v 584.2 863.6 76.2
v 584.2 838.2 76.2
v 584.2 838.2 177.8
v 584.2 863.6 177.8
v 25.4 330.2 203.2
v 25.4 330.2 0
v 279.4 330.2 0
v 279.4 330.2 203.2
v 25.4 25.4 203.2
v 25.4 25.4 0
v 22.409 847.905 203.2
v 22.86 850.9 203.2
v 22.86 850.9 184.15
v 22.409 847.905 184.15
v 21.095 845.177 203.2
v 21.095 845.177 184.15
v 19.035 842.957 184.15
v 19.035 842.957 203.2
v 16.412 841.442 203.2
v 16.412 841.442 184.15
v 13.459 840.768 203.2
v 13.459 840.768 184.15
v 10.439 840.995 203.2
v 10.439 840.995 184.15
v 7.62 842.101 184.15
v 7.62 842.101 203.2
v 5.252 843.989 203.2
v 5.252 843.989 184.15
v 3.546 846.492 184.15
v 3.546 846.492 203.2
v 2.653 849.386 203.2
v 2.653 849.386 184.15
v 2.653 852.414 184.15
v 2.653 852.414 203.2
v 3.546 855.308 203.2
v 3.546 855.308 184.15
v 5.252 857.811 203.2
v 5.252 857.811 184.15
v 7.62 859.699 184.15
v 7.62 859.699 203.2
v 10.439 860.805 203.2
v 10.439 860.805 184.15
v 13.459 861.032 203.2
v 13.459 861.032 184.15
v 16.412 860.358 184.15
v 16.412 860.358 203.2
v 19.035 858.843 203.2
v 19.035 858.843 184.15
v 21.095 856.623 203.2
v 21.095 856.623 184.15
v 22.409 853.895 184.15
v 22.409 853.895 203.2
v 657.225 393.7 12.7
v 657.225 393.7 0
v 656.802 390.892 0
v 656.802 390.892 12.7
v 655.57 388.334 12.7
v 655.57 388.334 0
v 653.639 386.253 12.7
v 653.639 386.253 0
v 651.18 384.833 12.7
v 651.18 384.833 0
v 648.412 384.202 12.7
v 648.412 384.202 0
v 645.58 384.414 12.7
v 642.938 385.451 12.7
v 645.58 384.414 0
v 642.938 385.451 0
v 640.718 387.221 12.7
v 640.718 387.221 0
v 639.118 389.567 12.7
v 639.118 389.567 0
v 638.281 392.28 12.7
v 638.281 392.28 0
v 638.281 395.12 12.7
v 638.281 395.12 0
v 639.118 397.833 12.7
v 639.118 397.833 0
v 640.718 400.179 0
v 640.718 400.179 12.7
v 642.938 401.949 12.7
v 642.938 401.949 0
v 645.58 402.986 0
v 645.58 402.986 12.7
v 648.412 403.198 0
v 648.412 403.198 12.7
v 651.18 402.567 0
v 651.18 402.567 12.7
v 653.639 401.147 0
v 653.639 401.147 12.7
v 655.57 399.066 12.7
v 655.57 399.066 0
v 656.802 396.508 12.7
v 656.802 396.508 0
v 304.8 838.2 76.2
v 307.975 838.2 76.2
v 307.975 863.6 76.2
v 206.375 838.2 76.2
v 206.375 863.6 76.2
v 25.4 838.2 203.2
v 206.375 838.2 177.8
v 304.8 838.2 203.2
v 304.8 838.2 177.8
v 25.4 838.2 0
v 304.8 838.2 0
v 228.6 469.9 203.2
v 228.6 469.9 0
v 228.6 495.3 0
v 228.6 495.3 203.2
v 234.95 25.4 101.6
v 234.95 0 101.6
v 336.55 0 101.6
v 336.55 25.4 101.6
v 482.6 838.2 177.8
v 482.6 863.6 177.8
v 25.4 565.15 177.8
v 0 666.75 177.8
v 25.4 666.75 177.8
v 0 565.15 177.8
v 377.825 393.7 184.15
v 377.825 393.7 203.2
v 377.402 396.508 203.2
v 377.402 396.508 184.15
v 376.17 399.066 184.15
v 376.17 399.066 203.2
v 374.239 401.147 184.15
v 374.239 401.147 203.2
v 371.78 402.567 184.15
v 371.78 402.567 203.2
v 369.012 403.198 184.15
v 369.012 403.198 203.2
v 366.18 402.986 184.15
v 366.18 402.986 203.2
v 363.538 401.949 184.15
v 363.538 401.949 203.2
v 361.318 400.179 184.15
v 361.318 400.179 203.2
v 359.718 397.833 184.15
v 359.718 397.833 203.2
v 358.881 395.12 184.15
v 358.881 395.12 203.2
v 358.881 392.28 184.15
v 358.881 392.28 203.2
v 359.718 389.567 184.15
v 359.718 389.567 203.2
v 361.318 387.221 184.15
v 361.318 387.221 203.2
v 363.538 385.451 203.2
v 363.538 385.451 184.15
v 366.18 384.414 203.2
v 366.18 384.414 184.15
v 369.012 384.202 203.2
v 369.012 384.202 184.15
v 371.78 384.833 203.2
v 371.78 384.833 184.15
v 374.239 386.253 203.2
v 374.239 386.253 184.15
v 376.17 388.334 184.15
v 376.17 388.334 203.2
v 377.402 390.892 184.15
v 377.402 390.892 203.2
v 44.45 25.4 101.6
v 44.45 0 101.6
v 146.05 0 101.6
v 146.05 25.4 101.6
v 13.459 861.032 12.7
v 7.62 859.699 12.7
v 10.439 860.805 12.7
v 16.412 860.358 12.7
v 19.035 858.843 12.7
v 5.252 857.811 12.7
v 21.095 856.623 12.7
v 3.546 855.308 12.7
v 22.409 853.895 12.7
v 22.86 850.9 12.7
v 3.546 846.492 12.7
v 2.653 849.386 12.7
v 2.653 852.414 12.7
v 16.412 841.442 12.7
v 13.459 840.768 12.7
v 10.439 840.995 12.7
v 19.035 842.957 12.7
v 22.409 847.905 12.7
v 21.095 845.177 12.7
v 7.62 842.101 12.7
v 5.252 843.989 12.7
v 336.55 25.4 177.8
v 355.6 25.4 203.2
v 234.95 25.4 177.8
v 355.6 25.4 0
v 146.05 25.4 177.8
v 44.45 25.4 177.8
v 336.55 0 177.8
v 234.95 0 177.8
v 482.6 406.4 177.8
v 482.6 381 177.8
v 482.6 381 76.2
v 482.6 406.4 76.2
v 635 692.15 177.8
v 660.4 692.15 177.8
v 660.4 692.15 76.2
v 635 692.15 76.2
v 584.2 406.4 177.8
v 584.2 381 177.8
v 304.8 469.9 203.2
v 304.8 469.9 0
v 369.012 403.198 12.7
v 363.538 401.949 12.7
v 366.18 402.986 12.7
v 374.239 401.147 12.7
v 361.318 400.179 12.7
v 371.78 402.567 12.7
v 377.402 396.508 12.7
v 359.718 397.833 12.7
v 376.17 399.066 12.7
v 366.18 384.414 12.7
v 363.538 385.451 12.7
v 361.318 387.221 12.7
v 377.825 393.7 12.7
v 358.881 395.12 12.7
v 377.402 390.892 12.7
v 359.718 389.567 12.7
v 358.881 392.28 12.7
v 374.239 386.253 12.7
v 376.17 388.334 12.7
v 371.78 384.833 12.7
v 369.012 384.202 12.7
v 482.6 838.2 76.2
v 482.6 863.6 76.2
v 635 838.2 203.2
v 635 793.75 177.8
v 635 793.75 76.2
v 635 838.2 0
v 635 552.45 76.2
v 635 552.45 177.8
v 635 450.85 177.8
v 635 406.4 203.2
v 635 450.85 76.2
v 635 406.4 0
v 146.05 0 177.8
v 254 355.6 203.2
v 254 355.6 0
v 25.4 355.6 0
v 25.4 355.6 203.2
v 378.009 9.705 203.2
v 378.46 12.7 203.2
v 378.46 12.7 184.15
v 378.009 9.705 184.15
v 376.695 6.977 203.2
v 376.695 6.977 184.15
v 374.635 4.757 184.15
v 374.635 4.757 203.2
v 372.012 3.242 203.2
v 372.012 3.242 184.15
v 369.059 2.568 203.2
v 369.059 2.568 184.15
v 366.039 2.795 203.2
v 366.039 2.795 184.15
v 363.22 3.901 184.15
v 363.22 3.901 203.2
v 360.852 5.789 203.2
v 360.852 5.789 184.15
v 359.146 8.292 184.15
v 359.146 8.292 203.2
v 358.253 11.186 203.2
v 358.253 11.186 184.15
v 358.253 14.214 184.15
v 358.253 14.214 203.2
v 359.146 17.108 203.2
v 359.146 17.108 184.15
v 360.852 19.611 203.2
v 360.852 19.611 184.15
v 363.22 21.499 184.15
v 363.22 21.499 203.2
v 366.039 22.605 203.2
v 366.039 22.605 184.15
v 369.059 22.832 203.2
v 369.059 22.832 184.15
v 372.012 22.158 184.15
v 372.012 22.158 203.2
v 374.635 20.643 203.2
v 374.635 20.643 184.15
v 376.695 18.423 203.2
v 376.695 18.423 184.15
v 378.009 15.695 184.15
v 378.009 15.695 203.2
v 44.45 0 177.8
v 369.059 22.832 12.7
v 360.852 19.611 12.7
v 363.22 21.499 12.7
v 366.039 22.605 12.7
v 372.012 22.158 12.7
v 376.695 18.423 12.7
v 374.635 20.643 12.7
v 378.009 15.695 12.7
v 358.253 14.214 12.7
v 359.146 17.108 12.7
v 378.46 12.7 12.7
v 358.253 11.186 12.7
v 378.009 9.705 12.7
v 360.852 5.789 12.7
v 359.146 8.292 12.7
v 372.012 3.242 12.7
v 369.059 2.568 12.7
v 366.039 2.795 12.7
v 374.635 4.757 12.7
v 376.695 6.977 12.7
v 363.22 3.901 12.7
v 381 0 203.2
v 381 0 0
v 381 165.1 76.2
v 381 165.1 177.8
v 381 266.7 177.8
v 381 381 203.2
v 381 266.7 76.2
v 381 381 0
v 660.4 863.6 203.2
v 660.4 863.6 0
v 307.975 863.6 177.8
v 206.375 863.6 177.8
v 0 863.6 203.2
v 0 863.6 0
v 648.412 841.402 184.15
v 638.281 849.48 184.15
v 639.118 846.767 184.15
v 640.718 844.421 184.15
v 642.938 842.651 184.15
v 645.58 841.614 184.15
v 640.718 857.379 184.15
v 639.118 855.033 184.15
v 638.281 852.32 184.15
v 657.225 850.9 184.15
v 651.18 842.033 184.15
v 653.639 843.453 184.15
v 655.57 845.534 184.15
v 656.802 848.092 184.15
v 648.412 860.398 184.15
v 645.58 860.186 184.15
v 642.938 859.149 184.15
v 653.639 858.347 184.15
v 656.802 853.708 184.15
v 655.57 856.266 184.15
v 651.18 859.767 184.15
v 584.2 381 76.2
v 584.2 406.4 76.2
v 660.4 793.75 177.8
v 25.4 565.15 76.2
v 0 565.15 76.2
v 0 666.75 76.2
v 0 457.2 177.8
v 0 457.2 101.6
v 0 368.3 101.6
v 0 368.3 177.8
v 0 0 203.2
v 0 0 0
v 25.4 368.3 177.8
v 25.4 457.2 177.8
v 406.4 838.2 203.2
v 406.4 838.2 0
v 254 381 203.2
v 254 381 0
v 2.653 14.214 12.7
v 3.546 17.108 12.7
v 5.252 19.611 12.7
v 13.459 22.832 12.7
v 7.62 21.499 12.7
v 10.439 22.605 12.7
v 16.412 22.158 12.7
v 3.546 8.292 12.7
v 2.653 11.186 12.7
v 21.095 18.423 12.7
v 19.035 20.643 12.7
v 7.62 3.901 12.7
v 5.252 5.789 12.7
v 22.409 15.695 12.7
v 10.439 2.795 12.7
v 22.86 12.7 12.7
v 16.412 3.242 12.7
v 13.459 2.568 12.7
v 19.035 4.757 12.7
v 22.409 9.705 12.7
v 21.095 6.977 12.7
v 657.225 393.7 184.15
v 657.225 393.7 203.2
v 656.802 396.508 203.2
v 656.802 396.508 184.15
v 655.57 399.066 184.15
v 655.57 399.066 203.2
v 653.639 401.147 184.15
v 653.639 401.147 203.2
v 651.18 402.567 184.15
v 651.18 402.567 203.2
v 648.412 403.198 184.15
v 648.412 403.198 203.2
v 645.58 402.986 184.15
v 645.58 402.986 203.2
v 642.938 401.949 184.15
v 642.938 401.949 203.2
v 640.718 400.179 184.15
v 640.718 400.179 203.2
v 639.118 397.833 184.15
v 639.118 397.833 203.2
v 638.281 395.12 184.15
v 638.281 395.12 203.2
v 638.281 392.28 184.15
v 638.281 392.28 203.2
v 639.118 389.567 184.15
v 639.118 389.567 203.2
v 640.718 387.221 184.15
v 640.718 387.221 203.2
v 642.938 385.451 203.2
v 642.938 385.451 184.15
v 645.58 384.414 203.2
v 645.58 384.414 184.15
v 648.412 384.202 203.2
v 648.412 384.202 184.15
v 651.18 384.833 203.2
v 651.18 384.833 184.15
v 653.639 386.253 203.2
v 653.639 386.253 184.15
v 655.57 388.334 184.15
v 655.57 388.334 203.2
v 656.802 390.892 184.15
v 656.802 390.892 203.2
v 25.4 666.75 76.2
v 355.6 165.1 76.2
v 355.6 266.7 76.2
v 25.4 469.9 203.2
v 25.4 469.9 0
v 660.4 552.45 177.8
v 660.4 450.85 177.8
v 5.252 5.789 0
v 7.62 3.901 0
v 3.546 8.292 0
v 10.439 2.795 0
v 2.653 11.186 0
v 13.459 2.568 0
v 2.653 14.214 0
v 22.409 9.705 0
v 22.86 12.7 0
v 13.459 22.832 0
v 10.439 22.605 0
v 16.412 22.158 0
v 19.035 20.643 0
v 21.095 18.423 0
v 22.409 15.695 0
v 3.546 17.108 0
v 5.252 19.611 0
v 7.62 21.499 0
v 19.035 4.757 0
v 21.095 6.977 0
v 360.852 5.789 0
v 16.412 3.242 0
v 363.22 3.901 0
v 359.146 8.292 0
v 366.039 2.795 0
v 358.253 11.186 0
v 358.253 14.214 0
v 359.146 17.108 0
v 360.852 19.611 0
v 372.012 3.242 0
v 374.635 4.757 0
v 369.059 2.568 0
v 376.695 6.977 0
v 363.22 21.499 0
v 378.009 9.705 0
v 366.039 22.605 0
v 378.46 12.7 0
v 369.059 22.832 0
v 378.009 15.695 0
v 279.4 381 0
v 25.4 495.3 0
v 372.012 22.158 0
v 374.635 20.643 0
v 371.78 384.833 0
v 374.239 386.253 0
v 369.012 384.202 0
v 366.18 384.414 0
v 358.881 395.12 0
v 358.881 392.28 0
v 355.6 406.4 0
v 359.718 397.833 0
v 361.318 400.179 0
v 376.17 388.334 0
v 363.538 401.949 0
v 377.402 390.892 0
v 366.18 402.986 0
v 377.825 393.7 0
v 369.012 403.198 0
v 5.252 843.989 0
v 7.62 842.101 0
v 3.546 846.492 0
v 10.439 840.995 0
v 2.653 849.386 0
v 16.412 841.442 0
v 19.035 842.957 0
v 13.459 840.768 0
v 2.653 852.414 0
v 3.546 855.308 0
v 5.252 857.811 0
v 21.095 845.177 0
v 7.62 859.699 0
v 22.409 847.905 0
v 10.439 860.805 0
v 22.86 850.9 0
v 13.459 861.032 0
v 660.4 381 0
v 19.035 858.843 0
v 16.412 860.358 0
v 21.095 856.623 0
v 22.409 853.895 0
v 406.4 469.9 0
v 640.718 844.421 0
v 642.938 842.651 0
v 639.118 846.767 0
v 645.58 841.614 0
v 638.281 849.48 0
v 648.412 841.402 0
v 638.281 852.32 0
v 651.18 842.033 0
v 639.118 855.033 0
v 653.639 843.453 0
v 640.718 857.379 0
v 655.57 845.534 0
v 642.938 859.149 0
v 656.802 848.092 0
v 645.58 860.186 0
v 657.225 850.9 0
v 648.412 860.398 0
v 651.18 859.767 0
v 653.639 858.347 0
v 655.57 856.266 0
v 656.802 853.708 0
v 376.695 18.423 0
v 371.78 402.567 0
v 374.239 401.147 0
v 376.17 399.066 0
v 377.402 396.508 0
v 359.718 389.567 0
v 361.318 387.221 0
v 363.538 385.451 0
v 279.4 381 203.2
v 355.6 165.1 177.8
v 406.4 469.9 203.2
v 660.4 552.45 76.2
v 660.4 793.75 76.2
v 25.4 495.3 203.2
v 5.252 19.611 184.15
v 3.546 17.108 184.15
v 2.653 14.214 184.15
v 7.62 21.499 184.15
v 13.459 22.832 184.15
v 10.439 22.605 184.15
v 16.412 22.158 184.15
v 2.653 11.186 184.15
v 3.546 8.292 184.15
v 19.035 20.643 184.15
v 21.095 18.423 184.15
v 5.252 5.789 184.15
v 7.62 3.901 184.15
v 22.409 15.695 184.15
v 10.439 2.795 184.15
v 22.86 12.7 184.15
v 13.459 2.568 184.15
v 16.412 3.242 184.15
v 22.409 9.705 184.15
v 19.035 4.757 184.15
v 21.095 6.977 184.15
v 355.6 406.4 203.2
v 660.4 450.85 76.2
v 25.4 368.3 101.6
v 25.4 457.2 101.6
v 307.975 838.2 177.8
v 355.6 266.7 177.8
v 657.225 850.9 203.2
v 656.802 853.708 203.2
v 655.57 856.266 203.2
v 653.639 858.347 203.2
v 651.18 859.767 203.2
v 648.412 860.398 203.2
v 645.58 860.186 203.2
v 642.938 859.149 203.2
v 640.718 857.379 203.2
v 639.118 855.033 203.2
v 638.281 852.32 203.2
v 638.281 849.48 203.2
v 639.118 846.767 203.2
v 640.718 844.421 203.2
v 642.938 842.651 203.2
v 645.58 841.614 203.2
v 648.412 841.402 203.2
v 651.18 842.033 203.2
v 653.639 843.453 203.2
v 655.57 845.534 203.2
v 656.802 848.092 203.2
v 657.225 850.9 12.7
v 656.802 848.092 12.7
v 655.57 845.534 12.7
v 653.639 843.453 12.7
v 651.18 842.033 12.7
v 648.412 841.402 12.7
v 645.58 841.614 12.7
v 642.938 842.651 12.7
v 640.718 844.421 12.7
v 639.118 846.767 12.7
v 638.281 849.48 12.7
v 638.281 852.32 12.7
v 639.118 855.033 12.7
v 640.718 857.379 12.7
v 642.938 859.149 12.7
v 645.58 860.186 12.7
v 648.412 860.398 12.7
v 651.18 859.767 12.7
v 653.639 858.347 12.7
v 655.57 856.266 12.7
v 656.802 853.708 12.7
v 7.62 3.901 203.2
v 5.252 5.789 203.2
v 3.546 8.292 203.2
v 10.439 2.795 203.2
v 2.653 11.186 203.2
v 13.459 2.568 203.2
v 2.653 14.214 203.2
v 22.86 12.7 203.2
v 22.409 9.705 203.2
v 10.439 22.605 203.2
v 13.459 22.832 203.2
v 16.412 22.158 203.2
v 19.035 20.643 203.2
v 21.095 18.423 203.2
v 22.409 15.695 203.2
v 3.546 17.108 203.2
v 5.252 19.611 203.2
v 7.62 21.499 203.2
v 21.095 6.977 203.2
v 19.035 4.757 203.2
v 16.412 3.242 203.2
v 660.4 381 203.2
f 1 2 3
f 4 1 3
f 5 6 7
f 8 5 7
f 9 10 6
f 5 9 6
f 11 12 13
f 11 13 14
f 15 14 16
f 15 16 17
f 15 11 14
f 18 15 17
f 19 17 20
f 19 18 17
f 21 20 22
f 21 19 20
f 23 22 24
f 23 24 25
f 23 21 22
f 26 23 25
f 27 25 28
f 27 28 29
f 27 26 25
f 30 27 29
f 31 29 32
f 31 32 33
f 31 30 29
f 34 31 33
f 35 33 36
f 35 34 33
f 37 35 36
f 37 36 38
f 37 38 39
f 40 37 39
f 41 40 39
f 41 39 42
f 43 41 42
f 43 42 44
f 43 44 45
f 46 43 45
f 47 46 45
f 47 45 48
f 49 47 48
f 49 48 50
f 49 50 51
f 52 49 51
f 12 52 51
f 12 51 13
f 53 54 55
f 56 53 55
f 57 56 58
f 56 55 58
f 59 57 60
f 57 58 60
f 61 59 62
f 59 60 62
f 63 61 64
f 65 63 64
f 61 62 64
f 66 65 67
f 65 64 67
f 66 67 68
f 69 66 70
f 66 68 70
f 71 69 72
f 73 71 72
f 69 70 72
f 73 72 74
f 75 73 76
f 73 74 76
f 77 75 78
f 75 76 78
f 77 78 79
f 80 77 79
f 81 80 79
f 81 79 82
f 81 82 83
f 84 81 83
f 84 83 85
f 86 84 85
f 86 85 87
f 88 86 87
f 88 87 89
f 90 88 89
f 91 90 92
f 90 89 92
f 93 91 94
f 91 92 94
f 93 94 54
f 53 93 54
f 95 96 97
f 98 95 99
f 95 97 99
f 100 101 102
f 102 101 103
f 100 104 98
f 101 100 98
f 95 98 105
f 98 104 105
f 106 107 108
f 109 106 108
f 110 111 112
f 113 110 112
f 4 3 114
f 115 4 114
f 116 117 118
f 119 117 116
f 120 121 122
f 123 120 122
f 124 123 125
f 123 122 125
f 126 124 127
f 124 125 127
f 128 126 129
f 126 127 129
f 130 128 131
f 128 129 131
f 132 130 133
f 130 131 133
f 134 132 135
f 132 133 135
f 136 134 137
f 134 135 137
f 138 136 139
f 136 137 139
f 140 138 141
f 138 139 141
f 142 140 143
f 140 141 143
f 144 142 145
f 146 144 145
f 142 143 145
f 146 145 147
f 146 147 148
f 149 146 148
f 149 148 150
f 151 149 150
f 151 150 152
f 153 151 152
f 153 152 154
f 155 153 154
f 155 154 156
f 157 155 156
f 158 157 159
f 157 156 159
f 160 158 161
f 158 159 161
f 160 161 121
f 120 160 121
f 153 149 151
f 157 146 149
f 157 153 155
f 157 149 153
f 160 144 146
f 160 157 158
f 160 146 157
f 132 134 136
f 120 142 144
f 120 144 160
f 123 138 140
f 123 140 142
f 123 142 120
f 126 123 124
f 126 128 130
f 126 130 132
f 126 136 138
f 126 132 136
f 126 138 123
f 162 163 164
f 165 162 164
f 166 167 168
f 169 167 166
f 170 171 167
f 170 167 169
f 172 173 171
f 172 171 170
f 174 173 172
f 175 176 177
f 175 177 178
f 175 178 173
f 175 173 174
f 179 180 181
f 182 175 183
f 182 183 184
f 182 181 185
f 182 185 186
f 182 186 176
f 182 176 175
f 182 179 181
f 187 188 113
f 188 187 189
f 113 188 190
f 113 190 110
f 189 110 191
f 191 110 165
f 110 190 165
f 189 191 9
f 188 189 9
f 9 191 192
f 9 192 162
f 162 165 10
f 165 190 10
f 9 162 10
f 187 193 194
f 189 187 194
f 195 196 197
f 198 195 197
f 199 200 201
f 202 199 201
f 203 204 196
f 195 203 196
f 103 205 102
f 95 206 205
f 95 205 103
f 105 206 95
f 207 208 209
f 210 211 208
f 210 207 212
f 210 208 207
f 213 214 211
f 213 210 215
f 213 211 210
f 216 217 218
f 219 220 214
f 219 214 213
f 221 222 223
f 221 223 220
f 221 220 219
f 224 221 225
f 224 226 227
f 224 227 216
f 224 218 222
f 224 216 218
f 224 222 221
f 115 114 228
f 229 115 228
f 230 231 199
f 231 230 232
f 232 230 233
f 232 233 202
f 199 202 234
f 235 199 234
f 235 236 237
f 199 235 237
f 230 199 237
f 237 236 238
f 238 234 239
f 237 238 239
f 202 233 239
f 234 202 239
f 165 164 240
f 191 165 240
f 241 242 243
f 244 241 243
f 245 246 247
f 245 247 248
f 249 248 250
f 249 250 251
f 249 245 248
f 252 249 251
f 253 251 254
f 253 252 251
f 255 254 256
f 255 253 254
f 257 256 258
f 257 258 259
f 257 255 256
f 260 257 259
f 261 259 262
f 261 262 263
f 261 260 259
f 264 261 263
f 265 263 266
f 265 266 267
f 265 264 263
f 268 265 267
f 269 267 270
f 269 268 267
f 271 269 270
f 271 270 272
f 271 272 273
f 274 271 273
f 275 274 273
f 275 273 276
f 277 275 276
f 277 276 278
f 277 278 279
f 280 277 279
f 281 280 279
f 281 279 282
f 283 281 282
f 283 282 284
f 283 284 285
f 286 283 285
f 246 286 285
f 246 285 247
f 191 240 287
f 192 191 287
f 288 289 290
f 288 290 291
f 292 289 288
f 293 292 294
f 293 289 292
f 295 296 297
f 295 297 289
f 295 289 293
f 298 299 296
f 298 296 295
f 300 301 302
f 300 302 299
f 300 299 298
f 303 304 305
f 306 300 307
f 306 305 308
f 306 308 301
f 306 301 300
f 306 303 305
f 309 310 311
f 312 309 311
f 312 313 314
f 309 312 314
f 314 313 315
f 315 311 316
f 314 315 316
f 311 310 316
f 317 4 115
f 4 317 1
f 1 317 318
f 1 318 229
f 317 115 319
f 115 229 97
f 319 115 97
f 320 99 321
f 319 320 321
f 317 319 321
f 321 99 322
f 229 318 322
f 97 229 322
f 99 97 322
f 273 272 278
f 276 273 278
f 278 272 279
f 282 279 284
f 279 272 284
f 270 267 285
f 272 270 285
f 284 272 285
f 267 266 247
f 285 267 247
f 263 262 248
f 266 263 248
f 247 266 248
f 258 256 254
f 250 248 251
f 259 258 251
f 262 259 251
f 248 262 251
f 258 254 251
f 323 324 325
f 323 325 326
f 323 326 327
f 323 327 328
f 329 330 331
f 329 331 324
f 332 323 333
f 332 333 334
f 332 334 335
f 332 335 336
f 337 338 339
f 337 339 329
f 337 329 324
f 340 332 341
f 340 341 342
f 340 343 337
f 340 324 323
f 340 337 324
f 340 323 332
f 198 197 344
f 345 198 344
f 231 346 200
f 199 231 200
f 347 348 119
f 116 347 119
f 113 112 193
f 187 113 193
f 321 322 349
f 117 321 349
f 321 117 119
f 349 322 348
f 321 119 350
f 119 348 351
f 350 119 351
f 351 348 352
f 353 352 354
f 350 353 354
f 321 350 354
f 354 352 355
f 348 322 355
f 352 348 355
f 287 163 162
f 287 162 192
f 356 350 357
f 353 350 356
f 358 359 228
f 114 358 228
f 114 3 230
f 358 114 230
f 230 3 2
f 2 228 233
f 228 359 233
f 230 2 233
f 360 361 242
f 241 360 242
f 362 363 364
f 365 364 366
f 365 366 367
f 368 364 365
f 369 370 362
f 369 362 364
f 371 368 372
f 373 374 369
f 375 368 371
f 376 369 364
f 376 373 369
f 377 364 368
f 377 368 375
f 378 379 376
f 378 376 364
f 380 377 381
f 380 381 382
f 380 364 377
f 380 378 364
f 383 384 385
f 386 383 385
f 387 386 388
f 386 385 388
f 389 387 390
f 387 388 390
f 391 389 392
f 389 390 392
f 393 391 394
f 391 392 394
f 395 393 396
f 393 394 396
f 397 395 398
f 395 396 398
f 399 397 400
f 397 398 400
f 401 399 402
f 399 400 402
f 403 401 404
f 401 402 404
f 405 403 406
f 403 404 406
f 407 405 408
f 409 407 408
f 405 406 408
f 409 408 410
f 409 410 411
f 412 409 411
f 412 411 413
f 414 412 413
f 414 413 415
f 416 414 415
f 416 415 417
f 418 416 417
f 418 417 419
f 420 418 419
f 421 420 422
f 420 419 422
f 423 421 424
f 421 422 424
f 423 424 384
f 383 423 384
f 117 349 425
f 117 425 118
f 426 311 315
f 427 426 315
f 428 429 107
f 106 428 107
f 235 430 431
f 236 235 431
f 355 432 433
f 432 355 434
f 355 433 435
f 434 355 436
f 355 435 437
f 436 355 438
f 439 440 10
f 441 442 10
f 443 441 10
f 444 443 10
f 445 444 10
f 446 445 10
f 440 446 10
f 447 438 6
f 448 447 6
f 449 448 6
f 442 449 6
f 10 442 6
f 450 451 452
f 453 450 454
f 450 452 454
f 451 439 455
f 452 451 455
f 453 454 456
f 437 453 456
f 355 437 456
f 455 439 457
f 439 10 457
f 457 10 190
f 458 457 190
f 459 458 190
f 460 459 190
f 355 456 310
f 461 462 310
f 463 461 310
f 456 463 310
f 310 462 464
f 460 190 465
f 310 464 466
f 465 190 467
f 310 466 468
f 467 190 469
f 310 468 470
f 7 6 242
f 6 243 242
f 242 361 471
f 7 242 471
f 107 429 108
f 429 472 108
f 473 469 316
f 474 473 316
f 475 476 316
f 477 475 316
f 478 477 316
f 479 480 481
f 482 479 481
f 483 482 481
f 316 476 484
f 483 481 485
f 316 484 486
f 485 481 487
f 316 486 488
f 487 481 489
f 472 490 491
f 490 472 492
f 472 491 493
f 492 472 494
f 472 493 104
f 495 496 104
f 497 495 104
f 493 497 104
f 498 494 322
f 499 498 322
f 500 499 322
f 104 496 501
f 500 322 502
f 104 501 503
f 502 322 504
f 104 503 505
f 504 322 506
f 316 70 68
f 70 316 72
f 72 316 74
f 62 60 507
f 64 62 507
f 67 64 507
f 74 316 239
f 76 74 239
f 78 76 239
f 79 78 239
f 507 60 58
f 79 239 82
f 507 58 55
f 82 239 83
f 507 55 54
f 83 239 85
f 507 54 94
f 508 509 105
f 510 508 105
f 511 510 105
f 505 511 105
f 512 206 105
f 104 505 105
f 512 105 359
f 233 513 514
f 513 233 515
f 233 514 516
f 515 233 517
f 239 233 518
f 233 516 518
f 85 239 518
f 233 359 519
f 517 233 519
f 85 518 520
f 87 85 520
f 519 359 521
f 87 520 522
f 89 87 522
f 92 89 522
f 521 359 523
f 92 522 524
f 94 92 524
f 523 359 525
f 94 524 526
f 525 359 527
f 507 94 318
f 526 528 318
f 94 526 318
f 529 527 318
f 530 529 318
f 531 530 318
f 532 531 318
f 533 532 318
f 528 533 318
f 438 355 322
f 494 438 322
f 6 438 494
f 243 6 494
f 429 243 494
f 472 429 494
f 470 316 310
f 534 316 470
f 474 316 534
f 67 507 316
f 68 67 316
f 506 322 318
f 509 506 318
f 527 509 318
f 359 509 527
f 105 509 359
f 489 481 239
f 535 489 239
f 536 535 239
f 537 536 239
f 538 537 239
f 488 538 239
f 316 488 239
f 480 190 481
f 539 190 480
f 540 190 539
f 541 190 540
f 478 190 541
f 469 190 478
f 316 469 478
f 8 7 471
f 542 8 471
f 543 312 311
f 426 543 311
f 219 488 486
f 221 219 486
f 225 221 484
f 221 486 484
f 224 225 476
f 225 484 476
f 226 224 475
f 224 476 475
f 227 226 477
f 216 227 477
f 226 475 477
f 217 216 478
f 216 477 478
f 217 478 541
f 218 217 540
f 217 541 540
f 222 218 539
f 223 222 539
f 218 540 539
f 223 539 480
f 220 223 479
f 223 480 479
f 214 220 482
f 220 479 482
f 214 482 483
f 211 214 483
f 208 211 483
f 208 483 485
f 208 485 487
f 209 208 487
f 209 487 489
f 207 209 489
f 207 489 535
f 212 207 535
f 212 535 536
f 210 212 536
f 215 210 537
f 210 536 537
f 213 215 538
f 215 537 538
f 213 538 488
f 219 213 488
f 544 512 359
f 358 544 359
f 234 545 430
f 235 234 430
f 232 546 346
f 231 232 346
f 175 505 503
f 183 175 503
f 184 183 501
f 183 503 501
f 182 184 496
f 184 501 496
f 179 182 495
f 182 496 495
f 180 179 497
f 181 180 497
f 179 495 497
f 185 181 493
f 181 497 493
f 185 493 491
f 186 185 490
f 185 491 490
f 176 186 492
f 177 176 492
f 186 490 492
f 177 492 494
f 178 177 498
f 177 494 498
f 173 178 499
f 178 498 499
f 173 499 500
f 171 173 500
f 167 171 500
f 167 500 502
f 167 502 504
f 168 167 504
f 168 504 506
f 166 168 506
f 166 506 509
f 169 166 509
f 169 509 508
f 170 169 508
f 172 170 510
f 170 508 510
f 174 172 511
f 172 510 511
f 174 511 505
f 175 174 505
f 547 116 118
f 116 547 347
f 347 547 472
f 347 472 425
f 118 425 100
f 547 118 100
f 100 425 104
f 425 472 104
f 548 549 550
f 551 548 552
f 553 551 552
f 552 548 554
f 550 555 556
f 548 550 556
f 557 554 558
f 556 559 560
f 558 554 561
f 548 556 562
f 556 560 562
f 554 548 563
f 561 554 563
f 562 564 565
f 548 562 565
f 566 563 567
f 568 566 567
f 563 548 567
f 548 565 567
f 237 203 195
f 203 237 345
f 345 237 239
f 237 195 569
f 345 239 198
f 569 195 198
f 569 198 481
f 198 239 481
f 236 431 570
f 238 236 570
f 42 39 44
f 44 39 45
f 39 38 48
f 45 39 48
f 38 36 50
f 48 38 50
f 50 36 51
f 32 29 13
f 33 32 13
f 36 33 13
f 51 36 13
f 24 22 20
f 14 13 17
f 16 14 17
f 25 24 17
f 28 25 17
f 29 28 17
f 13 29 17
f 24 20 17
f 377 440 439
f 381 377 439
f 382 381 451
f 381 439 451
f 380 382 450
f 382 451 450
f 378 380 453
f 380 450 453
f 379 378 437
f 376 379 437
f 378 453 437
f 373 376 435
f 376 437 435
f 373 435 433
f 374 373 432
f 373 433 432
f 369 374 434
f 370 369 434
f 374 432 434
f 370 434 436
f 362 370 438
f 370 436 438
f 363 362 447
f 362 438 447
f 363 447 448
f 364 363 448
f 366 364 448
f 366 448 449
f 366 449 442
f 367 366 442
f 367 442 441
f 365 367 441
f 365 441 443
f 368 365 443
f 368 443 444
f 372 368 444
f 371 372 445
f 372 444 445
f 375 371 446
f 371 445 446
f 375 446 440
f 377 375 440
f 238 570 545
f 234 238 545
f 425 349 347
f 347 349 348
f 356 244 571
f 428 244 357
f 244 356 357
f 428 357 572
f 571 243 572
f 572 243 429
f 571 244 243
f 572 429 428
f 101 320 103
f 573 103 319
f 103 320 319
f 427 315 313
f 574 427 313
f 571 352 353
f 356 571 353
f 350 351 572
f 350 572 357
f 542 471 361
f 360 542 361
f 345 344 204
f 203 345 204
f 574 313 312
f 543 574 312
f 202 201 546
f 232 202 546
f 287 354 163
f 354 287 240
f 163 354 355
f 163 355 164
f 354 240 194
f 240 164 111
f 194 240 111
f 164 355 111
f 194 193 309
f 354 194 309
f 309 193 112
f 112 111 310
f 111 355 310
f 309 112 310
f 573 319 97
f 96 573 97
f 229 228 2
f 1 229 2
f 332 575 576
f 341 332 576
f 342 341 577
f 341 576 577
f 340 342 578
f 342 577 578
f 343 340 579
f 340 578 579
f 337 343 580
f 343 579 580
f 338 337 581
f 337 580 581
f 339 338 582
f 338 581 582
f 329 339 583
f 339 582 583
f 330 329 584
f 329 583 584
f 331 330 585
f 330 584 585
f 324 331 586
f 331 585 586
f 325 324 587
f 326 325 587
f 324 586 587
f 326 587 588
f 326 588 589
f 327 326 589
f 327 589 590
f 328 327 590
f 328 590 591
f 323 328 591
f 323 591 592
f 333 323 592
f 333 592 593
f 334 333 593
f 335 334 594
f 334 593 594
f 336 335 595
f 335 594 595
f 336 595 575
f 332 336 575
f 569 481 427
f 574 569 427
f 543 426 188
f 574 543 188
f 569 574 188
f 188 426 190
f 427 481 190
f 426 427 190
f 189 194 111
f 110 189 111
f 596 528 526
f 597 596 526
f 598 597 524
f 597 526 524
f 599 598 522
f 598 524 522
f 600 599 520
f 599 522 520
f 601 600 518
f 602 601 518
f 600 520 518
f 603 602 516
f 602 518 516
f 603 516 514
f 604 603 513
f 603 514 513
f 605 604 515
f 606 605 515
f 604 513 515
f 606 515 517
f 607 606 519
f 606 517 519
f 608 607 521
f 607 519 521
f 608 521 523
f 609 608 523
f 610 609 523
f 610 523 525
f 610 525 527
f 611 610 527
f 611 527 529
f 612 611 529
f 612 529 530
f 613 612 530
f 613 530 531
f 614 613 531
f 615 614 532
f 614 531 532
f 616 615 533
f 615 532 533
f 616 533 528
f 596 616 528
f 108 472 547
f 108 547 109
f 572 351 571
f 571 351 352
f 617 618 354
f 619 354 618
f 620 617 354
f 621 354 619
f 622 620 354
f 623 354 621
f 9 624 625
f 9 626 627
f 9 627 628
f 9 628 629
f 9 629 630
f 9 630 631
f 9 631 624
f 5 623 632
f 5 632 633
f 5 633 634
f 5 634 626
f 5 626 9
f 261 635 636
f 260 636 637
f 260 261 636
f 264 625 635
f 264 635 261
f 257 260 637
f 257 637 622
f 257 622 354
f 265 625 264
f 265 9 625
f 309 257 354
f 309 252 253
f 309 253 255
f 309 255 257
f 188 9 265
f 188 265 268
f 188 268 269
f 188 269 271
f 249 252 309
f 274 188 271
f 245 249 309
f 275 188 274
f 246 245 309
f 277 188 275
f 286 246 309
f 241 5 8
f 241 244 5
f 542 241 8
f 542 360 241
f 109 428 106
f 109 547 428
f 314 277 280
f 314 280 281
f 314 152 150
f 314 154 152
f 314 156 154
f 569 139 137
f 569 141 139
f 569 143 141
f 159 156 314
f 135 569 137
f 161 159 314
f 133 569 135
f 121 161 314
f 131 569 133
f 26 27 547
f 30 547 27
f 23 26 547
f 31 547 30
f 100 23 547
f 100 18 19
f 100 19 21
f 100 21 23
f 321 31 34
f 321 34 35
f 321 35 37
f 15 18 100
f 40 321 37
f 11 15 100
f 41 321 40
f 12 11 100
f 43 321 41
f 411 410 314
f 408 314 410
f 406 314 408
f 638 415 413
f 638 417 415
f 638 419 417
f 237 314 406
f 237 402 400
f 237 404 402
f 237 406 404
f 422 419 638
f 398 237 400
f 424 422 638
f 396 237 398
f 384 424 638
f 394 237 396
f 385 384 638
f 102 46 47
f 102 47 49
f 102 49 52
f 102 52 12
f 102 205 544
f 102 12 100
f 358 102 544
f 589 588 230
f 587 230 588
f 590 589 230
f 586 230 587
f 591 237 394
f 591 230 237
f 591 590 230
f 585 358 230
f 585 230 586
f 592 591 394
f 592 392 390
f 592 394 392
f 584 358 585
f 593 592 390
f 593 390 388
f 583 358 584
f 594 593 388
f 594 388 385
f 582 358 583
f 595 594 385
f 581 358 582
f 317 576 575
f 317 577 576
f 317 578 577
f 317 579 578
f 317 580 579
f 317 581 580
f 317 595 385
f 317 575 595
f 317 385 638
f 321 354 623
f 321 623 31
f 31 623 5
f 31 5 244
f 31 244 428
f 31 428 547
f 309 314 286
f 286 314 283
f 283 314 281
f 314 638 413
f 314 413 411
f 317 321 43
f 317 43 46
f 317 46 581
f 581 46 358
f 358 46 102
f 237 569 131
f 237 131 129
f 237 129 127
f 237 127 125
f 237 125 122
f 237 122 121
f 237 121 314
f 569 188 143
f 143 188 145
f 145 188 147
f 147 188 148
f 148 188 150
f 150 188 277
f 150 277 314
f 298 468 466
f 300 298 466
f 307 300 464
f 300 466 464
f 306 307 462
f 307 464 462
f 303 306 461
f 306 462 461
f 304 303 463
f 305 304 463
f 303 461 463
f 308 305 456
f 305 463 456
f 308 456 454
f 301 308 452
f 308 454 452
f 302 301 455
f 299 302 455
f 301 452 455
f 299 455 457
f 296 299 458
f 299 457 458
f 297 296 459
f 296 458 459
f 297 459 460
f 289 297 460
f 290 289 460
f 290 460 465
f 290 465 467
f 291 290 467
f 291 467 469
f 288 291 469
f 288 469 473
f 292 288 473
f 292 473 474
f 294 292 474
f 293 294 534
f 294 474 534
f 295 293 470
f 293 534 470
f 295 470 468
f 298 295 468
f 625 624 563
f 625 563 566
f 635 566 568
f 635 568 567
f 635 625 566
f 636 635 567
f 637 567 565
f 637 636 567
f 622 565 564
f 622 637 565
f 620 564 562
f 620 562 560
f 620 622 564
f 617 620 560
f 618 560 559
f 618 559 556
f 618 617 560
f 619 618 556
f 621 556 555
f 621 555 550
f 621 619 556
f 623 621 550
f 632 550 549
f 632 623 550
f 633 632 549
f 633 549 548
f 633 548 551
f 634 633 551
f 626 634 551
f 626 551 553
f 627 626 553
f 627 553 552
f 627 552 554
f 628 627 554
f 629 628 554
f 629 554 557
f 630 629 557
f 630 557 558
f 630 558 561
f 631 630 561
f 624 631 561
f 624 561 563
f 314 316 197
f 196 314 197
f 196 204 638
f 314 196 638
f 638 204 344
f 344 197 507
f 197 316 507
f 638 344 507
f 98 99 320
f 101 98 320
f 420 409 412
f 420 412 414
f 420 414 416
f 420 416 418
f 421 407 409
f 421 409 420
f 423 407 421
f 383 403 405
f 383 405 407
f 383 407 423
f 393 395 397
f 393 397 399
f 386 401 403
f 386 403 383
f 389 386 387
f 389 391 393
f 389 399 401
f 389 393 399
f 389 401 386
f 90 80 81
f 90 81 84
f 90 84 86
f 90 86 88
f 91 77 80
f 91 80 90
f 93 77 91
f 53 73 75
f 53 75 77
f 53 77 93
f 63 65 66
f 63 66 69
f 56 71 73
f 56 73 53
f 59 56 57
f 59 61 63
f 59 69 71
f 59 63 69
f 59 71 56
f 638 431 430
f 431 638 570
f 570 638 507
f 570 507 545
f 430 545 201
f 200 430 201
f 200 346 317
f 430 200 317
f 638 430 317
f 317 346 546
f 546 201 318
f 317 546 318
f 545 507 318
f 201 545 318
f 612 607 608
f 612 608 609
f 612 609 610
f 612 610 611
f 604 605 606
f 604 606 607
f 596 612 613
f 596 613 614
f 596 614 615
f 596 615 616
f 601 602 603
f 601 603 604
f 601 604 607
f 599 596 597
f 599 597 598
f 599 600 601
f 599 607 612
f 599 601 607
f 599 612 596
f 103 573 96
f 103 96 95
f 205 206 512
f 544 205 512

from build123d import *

# Parameters (mm, degrees)
F0_W      = 101.6
F0_H      = 368.3
F0_W_2    = 203.2
F0_H_2    = 25.4
F1_DEPTH  = 203.2
F2_R      = 10.16
F2_R_2    = 9.525
F3_DEPTH  = 12.7
F4_DEPTH  = 203.2
F5_DEPTH  = 31.75
F6_W      = 50.8
F6_H      = 76.2
F7_DEPTH  = 25.4
F9_DEPTH  = 25.4
F11_DEPTH = 2540
F13_DEPTH = 25.4
F15_DEPTH = 25.4
F16_W     = 88.9
F16_H     = 76.2
F17_DEPTH = 25.4
F16_W_2   = 101.6
F16_H_2   = 101.6
F18_DEPTH = 25.4
F19_R     = 9.525
F20_DEPTH = 19.05


# Not quite as in the source:
# - a feature names something its author has since deleted; it is built from what else it names


with BuildPart() as f1:
    # F0 (on Top) → F1 (new body)
    with BuildSketch(Plane.XY):
        Polygon((0, 863.6), (0, 0), (381, 0), (381, 381), (660.4, 381), (660.4, 406.4), (660.4, 838.2), (660.4, 863.6), align=None)
        Polygon((406.4, 838.2), (635, 838.2), (635, 406.4), (355.6, 406.4), (355.6, 25.4), (25.4, 25.4), (25.4, 38.7719720602), (25.4, 330.2), (25.4, 355.6), (25.4, 469.9), (25.4, 495.3), (25.4, 838.2), (304.8, 838.2), align=None, mode=Mode.SUBTRACT)
        with Locations((355.6, 654.05)):
            Rectangle(F0_W, F0_H)
        Polygon((254, 355.6), (25.4, 355.6), (25.4, 330.2), (279.4, 330.2), (279.4, 355.6), (279.4, 381), (254, 381), align=None)
        with Locations((127, 482.6)):
            Rectangle(F0_W_2, F0_H_2)
    extrude(amount=F1_DEPTH)

    # F2 (on face) → F3 (cut)
    with BuildSketch(Plane(origin=(0, 0, 0), x_dir=(1, 0, 0), z_dir=(0, 0, -1))):
        with Locations((12.7, -850.9)):
            Circle(F2_R)
        with Locations((12.7, -12.7)):
            Circle(F2_R)
        with Locations((368.3, -12.7)):
            Circle(F2_R)
        with Locations((647.7, -850.9)):
            Circle(F2_R_2)
        with Locations((368.3, -393.7)):
            Circle(F2_R_2)
        with Locations((647.7, -393.7)):
            Circle(F2_R_2)
    extrude(amount=-F3_DEPTH, mode=Mode.SUBTRACT)

    # F4 (add): faces of the model
    f4_faces = [f1.faces().sort_by_distance(p)[0] for p in [
        (12.7, 12.7, 12.7),
        (368.3, 12.7, 12.7),
        (12.7, 850.9, 12.7),
    ]]
    extrude(f4_faces, amount=-F4_DEPTH)

    # F5 (cut): faces of the model
    f5_faces = [f1.faces().sort_by_distance(p)[0] for p in [
        (12.7, 850.9, 215.9),
        (368.3, 12.7, 215.9),
        (12.7, 12.7, 215.9),
    ]]
    extrude(f5_faces, amount=-F5_DEPTH, mode=Mode.SUBTRACT)

    # F6 (on face) → F7 (cut)
    with BuildSketch(Plane.XZ):
        with Locations((120.65, 139.7)):
            Rectangle(F6_W, F6_H)
        with Locations((69.85, 139.7)):
            Rectangle(F6_W, F6_H)
        Polygon((234.95, 177.8), (234.95, 101.6), (336.55, 101.6), (336.55, 177.8), (285.75, 177.8), align=None)
    extrude(amount=-F7_DEPTH, mode=Mode.SUBTRACT)

    # F8 (on face) → F9 (cut)
    with BuildSketch(Plane.YZ.offset(381)):
        Polygon((165.1, 76.2), (190.5, 76.2), (266.7, 76.2), (266.7, 177.8), (165.1, 177.8), align=None)
    extrude(amount=-F9_DEPTH, mode=Mode.SUBTRACT)

    # F10 (on face) → F11 (cut)
    with BuildSketch(Plane.XZ.offset(-381)):
        Polygon((482.6, 76.2), (533.4, 76.2), (584.2, 76.2), (584.2, 177.8), (482.6, 177.8), align=None)
    extrude(amount=-F11_DEPTH, mode=Mode.SUBTRACT)

    # F12 (on face) → F13 (cut)
    with BuildSketch(Plane.YZ.offset(660.4)):
        Polygon((450.85, 76.2), (501.65, 76.2), (552.45, 76.2), (552.45, 177.8), (450.85, 177.8), align=None)
        Polygon((793.75, 177.8), (692.15, 177.8), (692.15, 76.2), (742.95, 76.2), (793.75, 76.2), align=None)
    extrude(amount=-F13_DEPTH, mode=Mode.SUBTRACT)

    # F14 (on face) → F15 (cut)
    with BuildSketch(Plane(origin=(0, 863.6, 0), x_dir=(-1, 0, 0), z_dir=(0, 1, 0))):
        Polygon((-206.375, 177.8), (-257.175, 177.8), (-307.975, 177.8), (-307.975, 76.2), (-206.375, 76.2), align=None)
    extrude(amount=-F15_DEPTH, mode=Mode.SUBTRACT)

    # F16 (on face) → F17 (cut)
    with BuildSketch(Plane(origin=(0, 0, 0), x_dir=(0, -1, 0), z_dir=(-1, 0, 0))):
        with Locations((-412.75, 139.7)):
            Rectangle(F16_W, F16_H)
    extrude(amount=-F17_DEPTH, mode=Mode.SUBTRACT)

    # F16 (on face) → F18 (cut)
    with BuildSketch(Plane(origin=(0, 0, 0), x_dir=(0, -1, 0), z_dir=(-1, 0, 0))):
        with Locations((-412.75, 139.7)):
            Rectangle(F16_W, F16_H)
        with Locations((-615.95, 127)):
            Rectangle(F16_W_2, F16_H_2)
    extrude(amount=-F18_DEPTH, mode=Mode.SUBTRACT)

    # F19 (on face) → F20 (cut)
    with BuildSketch(Plane.XY.offset(203.2)):
        with Locations((368.3, 393.7)):
            Circle(F19_R)
        with Locations((647.7, 393.7)):
            Circle(F19_R)
        with Locations((647.7, 850.9)):
            Circle(F19_R)
    extrude(amount=-F20_DEPTH, mode=Mode.SUBTRACT)


solid = f1.part
